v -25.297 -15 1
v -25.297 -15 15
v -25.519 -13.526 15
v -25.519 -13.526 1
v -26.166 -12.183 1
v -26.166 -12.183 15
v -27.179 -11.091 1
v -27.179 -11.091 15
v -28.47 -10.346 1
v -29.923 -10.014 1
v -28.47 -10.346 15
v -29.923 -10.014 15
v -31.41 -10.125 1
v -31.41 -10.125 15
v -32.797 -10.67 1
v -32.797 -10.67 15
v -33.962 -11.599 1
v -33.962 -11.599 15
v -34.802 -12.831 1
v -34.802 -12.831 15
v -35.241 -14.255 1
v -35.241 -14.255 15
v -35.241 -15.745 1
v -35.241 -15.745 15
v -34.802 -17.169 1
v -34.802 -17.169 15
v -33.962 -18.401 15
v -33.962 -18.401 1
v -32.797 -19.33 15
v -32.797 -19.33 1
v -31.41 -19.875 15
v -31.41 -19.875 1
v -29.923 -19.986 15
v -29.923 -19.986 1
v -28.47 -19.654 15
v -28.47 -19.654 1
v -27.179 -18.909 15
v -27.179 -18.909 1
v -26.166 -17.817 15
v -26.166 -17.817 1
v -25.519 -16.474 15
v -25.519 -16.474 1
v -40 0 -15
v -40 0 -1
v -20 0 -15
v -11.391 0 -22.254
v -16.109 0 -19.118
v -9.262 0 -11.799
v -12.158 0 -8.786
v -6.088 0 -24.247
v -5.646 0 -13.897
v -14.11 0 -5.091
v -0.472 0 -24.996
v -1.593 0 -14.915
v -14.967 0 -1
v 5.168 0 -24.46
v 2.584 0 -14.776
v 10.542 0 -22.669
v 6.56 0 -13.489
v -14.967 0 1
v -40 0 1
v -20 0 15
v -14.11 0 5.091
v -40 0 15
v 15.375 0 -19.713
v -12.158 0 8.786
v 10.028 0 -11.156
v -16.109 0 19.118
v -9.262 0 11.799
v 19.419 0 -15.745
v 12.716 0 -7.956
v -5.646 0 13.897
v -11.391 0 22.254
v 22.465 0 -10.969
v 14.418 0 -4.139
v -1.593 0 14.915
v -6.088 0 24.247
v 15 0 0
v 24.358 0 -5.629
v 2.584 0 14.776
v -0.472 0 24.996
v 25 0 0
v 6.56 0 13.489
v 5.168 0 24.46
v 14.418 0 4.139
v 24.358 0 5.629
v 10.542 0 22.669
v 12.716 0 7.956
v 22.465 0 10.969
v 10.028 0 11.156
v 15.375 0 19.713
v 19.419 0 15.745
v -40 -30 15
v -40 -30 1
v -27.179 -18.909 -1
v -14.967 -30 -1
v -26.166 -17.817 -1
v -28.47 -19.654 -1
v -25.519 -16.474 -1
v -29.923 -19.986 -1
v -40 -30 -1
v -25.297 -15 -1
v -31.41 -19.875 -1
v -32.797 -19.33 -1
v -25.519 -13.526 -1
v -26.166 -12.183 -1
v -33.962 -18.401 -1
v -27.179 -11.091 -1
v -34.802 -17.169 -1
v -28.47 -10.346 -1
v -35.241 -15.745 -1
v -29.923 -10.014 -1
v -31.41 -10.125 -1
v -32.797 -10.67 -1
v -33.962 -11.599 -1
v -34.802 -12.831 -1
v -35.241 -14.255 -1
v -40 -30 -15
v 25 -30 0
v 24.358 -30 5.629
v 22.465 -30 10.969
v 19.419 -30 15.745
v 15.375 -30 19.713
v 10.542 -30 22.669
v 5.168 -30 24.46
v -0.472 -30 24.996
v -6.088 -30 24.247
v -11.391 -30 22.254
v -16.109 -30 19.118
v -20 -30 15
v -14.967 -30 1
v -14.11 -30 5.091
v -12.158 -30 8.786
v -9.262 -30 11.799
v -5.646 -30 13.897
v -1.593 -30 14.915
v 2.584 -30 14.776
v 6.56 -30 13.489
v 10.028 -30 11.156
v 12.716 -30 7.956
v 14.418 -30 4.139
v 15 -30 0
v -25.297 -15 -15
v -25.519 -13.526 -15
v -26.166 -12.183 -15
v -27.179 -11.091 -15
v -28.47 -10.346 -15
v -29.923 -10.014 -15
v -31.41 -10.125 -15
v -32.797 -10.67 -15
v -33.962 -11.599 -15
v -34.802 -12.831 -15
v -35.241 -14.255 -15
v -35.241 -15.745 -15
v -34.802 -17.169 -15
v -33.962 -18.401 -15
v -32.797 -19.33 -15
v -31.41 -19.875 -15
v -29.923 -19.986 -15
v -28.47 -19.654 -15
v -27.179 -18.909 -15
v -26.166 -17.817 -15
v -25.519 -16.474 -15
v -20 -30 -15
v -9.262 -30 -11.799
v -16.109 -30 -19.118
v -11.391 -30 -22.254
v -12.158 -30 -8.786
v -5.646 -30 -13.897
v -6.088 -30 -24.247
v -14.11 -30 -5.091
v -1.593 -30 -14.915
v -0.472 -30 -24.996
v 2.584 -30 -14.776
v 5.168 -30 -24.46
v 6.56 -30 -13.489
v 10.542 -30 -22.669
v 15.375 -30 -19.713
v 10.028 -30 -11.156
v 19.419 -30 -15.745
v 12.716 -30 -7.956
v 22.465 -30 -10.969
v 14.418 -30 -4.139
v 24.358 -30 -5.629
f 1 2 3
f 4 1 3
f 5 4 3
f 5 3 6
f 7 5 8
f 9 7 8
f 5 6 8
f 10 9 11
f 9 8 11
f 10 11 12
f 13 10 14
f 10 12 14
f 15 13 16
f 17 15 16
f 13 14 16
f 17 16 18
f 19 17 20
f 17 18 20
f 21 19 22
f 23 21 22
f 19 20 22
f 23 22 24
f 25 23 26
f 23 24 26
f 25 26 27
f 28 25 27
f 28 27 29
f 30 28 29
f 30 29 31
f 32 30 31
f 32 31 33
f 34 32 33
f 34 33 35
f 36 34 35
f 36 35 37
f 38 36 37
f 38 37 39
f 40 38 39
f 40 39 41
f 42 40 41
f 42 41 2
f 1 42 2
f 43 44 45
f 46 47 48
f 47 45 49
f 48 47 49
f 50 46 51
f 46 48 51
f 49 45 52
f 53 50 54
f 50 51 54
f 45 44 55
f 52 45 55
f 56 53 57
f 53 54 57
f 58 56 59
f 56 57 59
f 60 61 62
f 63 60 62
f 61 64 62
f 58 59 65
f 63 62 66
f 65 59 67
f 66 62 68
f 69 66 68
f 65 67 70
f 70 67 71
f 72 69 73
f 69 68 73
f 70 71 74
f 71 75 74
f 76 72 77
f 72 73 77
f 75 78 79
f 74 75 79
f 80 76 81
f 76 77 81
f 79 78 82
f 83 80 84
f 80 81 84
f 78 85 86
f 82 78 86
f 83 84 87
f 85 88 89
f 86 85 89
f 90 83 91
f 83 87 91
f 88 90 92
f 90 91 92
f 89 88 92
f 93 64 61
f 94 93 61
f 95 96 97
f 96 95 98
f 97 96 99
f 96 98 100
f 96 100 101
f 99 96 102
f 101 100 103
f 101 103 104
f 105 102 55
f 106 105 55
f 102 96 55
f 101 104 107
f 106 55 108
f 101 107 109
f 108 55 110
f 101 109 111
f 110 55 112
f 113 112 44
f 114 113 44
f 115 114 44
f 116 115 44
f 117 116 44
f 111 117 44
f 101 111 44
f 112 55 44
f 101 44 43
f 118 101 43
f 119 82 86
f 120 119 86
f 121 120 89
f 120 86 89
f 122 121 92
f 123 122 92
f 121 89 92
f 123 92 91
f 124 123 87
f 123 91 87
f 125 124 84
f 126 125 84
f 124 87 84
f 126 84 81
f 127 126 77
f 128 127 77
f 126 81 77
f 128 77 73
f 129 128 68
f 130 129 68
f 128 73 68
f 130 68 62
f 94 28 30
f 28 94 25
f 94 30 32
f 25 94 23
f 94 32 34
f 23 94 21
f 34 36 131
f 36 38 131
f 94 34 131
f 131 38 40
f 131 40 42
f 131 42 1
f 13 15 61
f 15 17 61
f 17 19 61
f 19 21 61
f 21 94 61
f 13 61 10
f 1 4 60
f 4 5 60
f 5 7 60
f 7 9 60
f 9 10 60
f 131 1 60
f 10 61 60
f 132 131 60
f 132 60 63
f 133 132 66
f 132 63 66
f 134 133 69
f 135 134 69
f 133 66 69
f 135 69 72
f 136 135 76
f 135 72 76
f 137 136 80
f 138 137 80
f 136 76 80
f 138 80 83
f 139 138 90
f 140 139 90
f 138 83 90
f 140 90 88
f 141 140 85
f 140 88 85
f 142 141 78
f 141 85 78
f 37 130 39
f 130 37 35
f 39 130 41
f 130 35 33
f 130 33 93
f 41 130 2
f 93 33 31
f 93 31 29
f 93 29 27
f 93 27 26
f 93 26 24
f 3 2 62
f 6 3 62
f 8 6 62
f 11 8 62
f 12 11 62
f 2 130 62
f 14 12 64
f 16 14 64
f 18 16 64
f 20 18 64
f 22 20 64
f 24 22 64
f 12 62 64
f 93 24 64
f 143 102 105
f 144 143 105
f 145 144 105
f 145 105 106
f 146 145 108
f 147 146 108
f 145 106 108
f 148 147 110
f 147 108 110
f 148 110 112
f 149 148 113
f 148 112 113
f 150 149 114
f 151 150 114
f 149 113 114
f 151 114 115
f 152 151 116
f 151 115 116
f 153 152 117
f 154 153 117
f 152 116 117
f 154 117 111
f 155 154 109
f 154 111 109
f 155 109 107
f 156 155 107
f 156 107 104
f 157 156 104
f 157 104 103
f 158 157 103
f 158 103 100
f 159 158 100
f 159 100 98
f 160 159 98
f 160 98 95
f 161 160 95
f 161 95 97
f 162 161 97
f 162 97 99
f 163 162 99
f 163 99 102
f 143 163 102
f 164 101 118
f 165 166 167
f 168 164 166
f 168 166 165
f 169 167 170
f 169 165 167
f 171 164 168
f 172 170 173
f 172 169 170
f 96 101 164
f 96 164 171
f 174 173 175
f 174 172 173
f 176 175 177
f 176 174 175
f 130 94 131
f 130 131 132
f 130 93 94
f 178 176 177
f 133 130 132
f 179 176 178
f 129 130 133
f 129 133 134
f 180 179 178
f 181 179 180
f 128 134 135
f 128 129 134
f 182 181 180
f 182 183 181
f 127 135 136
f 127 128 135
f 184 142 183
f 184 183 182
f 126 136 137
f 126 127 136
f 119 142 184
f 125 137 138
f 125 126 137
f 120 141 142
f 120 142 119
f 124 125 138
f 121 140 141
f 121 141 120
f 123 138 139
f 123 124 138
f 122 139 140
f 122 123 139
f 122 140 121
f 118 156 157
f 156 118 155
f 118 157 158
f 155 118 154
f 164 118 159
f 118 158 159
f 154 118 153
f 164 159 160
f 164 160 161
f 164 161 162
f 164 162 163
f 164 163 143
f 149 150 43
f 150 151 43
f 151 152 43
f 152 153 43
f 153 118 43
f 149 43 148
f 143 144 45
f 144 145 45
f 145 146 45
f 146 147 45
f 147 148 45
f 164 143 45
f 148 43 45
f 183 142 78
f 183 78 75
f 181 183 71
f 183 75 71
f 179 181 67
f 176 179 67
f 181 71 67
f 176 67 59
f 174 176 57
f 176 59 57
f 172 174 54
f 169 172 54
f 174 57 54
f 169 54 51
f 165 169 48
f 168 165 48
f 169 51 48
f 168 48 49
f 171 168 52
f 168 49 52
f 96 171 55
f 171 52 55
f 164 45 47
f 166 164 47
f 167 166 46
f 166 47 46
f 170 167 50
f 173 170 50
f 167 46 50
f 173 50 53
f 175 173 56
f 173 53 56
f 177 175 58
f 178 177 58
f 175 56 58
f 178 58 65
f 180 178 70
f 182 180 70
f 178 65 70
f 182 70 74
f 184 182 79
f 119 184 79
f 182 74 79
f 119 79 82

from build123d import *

# Parameters (mm, degrees)
F1_DEPTH = 30
F2_R     = 5
F3_DEPTH = 40.001


with BuildPart() as f1:
    # F0 (on Front) → F1 (new body)
    with BuildSketch(Plane.XZ):
        with BuildLine():
            Line((-40, 1), (-24.9799919936, 1))
            ThreePointArc((-24.9799919936, 1), (-23.5541911331, 8.3785488042), (-20, 15))
            Line((-20, 15), (-40, 15))
            Line((-40, 15), (-40, 1))
        make_face()
        with BuildLine():
            ThreePointArc((-14.9666295471, 1), (0.5002783193, 14.9916550655), (15, 0))
            ThreePointArc((15, 0), (0.5002783193, -14.9916550655), (-14.9666295471, -1))
            Line((-14.9666295471, -1), (-24.9799919936, -1))
            ThreePointArc((-24.9799919936, -1), (-23.5541911331, -8.3785488042), (-20, -15))
            ThreePointArc((-20, -15), (7.9056941504, -23.7170824513), (25, 0))
            ThreePointArc((25, 0), (7.9056941504, 23.7170824513), (-20, 15))
            ThreePointArc((-20, 15), (-23.5541911331, 8.3785488042), (-24.9799919936, 1))
            Line((-24.9799919936, 1), (-14.9666295471, 1))
        make_face()
        with BuildLine():
            ThreePointArc((-20, -15), (-23.5541911331, -8.3785488042), (-24.9799919936, -1))
            Line((-24.9799919936, -1), (-40, -1))
            Line((-40, -1), (-40, -15))
            Line((-40, -15), (-20, -15))
        make_face()
    extrude(amount=F1_DEPTH)

    # F2 (on face) → F3 (cut, through all)
    with BuildSketch(Plane.XY.offset(15)):
        with Locations((-30.2969049662, -15)):
            Circle(F2_R)
    extrude(amount=-F3_DEPTH, mode=Mode.SUBTRACT)


solid = f1.part
